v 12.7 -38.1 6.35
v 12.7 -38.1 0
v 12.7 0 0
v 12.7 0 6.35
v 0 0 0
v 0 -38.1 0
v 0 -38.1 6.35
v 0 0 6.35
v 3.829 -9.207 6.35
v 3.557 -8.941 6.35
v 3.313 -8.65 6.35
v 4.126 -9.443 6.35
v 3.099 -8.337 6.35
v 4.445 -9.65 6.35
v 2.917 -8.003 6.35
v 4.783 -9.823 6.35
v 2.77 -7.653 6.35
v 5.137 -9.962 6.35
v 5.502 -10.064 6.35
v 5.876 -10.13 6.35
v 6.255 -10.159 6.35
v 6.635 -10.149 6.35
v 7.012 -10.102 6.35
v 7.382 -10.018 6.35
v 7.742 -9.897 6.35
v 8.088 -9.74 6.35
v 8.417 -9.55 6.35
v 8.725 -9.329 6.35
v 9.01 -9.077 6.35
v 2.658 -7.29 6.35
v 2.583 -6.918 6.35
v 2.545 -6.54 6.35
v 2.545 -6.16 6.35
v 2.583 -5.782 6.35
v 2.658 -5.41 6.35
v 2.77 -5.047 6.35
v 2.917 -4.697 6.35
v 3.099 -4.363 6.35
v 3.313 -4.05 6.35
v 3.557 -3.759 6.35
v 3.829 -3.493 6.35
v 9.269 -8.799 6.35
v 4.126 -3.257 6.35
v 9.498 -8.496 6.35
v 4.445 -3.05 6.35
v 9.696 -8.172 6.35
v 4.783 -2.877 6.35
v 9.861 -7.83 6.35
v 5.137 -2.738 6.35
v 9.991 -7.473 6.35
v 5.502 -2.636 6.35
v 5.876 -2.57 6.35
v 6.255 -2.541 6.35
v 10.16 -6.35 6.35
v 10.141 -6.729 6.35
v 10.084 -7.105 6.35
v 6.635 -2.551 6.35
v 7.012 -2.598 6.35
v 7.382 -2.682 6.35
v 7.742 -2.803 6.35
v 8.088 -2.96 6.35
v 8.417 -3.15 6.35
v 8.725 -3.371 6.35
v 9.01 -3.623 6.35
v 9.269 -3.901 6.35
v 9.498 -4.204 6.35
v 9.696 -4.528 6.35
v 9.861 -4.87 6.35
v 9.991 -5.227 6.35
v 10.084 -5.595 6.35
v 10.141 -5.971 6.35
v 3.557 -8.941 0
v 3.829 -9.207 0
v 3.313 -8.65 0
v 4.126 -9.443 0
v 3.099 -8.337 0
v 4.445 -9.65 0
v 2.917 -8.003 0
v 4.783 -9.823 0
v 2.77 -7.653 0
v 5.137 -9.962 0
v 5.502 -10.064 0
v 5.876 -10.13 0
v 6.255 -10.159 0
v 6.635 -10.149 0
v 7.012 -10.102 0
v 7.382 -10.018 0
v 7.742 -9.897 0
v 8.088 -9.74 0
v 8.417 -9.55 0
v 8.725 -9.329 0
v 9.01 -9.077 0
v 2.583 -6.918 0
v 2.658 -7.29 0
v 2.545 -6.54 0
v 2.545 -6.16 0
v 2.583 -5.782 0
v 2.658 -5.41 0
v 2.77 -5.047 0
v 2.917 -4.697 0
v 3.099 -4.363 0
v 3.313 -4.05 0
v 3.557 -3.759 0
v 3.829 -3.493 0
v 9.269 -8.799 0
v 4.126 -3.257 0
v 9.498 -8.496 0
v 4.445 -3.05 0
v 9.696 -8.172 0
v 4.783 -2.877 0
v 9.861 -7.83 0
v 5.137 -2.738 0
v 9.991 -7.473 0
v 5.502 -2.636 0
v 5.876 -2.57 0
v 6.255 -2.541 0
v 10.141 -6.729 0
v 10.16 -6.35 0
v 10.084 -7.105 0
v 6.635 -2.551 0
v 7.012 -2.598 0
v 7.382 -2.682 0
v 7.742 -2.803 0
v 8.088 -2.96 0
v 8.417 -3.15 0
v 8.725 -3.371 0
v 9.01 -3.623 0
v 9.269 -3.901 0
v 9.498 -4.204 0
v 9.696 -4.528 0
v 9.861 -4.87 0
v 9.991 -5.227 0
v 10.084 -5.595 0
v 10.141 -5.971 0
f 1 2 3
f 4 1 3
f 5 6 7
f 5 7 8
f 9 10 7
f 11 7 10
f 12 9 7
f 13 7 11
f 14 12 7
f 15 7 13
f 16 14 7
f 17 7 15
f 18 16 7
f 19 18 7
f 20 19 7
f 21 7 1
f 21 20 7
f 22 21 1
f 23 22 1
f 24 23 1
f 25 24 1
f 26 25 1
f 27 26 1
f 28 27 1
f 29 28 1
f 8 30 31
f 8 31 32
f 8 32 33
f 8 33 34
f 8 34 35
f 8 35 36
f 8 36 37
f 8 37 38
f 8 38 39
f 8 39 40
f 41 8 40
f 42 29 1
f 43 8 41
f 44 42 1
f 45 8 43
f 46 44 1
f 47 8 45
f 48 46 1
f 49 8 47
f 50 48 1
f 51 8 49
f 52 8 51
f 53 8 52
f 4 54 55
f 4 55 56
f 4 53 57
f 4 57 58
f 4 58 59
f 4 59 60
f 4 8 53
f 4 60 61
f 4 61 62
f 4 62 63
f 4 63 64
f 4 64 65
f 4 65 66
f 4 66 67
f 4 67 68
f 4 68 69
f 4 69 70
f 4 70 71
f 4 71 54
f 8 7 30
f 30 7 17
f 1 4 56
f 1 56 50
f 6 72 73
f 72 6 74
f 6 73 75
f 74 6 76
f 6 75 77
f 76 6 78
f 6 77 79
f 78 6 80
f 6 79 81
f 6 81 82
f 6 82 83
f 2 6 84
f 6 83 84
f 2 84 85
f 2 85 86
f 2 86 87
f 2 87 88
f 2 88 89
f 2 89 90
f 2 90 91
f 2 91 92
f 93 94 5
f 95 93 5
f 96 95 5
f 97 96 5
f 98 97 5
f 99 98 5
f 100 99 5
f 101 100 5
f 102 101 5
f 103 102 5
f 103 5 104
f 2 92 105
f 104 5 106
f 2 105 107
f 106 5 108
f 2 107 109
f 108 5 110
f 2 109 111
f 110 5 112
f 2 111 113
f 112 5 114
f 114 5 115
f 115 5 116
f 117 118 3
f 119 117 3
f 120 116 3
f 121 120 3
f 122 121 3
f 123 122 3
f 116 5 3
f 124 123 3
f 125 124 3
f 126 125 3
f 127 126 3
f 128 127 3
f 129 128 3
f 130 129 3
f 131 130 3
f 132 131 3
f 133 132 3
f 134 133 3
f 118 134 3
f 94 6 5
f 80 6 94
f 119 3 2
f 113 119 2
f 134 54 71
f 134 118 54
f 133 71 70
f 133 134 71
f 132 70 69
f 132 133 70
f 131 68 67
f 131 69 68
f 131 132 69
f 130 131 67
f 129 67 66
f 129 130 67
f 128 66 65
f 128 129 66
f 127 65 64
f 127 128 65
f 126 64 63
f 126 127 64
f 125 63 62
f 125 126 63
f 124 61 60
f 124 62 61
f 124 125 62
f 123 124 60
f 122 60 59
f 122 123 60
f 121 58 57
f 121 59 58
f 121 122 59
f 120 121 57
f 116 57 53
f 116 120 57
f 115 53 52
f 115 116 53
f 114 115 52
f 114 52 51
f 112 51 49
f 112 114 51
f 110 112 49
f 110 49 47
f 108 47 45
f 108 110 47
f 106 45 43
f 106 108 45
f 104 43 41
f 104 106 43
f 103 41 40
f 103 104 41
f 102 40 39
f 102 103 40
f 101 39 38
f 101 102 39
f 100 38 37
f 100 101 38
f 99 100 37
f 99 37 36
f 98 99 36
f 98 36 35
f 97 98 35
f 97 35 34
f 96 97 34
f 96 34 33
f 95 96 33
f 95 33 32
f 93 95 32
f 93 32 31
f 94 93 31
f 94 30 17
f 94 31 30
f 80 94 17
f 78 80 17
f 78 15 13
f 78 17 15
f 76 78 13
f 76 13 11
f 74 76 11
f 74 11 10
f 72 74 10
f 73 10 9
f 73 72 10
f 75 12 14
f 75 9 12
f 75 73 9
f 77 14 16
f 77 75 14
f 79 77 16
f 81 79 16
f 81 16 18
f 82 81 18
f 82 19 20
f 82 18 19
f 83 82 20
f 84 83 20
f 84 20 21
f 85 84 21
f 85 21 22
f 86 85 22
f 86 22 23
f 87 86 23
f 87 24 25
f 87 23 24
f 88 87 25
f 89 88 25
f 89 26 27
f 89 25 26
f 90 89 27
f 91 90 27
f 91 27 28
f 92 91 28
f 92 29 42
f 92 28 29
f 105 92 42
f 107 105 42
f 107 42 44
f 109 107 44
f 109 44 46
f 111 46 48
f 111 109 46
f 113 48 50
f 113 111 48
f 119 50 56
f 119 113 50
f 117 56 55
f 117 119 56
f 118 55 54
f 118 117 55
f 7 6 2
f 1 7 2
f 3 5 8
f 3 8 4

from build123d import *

# Parameters (mm, degrees)
SKETCH1_W               = 12.7
SKETCH1_H               = 38.1
BOSS_EXTRUDE1_DEPTH     = 6.35
CUT_EXTRUDE1_DEPTH      = 41.659838908
CUT_EXTRUDE1_DEPTH_BACK = 41.659838908
SKETCH2_R               = 3.81


with BuildPart() as part:
    # Sketch1 → Boss-Extrude1 (new body)
    with BuildSketch(Plane.XY):
        with Locations((6.35, -19.05)):
            Rectangle(SKETCH1_W, SKETCH1_H)
    extrude(amount=BOSS_EXTRUDE1_DEPTH)

    # Sketch2 → Cut-Extrude1 (cut, two sides: drawn at the far end of the back side and taken through both)
    with BuildSketch(Plane.XY.offset(6.35).offset(-CUT_EXTRUDE1_DEPTH_BACK)):
        with Locations((6.35, -6.35)):
            Circle(SKETCH2_R)
    extrude(amount=CUT_EXTRUDE1_DEPTH + CUT_EXTRUDE1_DEPTH_BACK, mode=Mode.SUBTRACT)


solid = part.part
